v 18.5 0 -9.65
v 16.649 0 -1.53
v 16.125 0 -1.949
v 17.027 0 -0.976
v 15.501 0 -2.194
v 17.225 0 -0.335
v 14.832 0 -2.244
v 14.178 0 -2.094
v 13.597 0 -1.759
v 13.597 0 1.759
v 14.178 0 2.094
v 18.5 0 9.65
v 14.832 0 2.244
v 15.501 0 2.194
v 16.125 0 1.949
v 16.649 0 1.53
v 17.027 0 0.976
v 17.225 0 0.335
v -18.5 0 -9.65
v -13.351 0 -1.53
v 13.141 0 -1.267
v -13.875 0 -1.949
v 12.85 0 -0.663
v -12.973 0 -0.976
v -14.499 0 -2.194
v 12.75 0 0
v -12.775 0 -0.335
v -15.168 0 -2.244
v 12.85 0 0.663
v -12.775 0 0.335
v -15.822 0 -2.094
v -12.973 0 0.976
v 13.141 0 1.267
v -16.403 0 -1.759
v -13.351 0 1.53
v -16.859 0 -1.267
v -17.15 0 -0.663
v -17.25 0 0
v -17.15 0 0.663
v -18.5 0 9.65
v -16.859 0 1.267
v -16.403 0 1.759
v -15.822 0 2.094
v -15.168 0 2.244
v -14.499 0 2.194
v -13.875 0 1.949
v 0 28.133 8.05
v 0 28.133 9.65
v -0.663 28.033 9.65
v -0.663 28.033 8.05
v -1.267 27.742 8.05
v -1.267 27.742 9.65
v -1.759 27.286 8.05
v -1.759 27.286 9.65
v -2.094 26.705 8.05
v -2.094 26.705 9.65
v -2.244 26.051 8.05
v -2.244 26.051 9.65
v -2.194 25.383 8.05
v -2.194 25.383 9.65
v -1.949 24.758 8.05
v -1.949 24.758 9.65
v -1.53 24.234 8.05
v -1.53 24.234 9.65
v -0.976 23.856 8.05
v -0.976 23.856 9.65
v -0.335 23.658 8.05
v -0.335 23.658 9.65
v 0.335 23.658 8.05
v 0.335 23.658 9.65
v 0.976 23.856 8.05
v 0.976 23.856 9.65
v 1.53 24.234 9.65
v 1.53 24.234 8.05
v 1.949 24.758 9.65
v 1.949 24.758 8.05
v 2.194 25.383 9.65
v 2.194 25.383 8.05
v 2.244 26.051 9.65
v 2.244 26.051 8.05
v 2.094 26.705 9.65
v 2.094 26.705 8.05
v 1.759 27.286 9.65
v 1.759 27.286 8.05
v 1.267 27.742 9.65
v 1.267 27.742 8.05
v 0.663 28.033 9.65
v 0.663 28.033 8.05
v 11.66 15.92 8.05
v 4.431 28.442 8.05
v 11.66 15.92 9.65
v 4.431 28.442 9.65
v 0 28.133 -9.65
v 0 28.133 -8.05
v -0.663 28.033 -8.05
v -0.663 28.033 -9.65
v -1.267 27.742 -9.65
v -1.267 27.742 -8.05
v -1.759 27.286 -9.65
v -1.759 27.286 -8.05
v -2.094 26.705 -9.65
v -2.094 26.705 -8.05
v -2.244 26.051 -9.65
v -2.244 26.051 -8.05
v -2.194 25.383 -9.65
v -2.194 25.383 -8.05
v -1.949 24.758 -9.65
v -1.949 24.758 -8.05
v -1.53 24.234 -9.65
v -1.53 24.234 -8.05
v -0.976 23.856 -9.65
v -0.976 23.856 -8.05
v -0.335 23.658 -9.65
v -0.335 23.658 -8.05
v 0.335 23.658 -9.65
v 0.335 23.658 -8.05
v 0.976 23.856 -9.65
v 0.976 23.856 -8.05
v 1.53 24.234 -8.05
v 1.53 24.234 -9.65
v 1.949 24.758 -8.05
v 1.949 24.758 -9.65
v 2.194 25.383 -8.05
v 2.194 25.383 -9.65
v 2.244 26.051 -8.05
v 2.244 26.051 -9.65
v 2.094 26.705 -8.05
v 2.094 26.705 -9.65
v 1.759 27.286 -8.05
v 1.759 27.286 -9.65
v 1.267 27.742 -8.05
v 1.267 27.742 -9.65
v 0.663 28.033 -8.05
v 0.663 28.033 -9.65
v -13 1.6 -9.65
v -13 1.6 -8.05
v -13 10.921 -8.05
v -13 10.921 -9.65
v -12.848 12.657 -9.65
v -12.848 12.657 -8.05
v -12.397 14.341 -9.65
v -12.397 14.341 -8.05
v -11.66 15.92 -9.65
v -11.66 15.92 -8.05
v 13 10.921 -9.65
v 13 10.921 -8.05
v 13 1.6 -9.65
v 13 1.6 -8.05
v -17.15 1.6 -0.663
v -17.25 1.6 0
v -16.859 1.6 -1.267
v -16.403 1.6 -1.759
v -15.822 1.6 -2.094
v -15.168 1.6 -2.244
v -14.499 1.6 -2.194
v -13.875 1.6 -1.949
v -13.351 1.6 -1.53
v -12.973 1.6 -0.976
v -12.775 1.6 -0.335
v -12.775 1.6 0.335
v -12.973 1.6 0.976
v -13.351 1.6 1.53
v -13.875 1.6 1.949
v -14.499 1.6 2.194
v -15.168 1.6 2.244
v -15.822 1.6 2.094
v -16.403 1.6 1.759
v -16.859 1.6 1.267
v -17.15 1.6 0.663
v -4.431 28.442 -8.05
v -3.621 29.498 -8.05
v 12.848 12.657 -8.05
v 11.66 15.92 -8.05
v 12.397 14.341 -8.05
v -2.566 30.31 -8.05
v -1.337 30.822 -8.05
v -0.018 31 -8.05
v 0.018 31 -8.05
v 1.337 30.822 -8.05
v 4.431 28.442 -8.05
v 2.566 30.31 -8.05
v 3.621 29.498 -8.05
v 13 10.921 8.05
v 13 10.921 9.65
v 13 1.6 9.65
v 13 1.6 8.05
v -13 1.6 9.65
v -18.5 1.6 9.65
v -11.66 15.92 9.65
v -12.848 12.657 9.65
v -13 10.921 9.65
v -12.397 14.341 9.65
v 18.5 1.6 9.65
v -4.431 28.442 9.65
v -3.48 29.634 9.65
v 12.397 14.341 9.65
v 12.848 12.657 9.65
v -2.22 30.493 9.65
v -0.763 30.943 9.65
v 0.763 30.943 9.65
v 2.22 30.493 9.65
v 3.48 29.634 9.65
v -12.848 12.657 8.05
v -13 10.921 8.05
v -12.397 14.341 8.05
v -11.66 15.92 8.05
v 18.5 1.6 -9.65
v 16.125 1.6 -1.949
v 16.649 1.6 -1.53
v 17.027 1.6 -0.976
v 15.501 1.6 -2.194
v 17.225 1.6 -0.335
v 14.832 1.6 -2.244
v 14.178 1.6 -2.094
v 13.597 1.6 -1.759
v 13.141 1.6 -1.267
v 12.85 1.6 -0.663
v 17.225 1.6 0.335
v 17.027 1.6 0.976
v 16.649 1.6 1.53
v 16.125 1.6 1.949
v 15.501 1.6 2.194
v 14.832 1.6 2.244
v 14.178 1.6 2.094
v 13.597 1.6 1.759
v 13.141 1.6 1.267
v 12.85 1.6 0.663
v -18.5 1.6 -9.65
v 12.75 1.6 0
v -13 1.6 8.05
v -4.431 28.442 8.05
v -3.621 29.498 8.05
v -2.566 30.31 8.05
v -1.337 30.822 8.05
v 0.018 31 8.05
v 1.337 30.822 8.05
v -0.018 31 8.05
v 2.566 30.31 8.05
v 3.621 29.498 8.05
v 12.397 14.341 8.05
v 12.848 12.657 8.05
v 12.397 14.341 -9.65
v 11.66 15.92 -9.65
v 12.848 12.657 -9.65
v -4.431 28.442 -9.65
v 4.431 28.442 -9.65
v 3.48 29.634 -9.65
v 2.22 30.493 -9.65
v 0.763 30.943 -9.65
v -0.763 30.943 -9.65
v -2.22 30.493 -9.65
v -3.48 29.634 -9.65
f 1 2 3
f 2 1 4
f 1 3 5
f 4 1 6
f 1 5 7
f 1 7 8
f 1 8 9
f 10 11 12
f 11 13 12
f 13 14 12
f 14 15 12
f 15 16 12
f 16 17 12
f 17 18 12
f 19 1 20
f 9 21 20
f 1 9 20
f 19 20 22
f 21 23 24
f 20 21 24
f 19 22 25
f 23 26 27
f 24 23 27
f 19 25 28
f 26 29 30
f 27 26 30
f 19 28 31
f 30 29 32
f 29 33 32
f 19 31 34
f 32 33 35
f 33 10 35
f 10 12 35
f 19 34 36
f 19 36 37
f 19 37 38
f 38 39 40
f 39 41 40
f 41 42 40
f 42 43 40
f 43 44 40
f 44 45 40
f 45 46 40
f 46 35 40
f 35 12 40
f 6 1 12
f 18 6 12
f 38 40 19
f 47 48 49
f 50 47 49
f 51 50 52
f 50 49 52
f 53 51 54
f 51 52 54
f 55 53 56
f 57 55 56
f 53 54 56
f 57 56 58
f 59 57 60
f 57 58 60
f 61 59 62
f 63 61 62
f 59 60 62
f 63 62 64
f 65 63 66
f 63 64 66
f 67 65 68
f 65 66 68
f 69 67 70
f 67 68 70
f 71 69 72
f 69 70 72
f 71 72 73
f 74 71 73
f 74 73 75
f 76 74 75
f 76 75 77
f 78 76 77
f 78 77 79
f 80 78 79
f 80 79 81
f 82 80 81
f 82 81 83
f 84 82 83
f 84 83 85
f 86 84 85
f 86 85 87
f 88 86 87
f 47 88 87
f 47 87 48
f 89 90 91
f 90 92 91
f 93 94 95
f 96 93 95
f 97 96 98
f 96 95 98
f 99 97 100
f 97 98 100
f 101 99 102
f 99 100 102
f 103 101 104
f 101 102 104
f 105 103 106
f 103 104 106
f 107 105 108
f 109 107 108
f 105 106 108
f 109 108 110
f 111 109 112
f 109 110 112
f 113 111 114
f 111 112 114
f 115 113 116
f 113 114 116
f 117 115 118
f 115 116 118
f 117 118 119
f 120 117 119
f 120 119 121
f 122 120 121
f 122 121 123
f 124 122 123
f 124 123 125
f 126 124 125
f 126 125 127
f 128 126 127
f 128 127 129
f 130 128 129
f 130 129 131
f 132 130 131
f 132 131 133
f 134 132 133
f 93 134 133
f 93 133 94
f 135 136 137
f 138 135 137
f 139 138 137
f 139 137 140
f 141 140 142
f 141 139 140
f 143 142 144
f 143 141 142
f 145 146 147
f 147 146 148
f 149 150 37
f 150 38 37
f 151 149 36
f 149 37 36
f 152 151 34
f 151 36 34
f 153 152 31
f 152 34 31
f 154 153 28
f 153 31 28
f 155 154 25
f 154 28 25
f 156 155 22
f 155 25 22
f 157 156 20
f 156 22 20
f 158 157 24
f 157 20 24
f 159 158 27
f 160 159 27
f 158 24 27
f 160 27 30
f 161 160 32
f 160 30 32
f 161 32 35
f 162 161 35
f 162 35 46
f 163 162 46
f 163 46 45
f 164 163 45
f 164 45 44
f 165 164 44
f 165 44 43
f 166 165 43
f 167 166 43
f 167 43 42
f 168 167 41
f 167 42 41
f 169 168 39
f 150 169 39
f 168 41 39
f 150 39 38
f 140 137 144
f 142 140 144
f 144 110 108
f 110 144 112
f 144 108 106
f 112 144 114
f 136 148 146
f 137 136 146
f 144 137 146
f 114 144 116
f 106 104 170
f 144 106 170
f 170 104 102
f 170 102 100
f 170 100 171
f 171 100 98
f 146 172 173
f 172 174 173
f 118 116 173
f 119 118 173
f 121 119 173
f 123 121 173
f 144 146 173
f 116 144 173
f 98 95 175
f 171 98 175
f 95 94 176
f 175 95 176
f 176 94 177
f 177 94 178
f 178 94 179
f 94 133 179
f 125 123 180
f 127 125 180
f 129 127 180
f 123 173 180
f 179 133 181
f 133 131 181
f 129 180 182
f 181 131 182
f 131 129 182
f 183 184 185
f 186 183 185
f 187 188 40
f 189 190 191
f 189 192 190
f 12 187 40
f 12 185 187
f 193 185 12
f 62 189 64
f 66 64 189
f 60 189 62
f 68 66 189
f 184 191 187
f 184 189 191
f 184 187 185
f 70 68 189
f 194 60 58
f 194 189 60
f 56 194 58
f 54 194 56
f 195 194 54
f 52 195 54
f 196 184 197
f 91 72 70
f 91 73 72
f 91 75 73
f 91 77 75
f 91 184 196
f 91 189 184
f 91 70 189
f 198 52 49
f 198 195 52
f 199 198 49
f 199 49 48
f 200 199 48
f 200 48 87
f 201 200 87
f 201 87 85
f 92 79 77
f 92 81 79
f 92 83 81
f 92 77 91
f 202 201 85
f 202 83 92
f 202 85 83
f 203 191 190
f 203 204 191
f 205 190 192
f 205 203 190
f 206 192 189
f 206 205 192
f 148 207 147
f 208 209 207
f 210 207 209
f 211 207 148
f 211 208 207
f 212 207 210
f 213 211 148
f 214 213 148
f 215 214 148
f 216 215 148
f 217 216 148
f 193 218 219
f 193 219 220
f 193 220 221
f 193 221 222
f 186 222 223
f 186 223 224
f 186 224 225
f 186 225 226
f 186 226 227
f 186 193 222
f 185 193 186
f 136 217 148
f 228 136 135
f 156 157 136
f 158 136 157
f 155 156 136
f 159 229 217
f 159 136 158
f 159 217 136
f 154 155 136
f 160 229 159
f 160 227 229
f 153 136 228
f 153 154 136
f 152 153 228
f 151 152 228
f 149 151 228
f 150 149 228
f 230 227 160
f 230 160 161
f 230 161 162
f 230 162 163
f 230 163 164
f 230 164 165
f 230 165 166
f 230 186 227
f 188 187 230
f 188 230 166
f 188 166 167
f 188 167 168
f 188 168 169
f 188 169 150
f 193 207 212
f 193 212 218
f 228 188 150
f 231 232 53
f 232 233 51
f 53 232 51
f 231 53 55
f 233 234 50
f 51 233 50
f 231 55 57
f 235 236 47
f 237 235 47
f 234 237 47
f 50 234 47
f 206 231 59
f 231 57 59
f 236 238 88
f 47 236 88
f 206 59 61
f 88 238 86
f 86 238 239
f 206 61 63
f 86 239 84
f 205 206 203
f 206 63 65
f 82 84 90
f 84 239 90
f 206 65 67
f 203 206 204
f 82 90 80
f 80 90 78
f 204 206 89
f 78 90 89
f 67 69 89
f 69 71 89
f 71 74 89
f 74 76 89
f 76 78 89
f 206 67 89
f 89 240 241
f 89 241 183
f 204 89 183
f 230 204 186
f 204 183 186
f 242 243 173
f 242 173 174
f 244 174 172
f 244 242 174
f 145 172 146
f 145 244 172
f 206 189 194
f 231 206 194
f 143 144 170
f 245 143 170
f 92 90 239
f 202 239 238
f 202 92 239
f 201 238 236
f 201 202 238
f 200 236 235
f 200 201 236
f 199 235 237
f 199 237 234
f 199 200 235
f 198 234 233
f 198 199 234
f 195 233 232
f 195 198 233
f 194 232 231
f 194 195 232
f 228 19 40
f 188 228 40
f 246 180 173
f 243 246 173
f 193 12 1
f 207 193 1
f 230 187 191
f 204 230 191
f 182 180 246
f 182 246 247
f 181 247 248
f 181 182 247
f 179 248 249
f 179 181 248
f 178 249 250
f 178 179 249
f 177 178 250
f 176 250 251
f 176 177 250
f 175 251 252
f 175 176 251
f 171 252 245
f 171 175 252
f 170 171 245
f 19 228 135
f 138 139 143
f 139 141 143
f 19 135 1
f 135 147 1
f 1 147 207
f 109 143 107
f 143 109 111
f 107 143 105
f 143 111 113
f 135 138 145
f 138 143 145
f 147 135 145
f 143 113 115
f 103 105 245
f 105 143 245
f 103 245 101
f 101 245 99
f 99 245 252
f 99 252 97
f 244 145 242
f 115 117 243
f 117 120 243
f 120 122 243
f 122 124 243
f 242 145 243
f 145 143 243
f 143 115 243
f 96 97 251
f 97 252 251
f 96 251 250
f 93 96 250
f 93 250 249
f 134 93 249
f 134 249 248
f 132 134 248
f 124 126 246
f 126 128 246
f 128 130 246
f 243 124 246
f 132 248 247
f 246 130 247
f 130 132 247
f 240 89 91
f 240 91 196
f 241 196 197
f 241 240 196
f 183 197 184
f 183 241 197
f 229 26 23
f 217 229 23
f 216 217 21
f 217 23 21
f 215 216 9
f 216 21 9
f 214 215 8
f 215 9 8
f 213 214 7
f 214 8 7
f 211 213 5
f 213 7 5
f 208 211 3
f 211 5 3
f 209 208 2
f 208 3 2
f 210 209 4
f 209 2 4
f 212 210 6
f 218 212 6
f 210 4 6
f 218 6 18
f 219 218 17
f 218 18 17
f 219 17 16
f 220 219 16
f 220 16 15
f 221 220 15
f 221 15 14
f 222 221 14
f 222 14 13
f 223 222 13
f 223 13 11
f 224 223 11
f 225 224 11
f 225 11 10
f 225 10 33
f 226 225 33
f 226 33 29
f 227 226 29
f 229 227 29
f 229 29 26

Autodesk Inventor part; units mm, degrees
ref_plane "YZ Plane" through (0, 0, 0) normal (1, 0, 0) x (0, 1, 0)
ref_plane "XZ Plane" through (0, 0, 0) normal (0, 1, 0) x (-1, 0, 0)
ref_plane "XY Plane" through (0, 0, 0) normal (0, 0, 1) x (1, 0, 0)
sketch "スケッチ1" plane through (0, 0, 0) normal (0, 1, 0) x (-1, 0, 0)
  line L0 (18.5, 9.65) -> (-18.5, 9.65)
  line L1 (-18.5, 9.65) -> (-18.5, -9.65)
  line L2 (-18.5, -9.65) -> (18.5, -9.65)
  line L3 (18.5, -9.65) -> (18.5, 9.65)
  line L4 (0, 9.65) -> (0, -9.65)
  circle A0 centre (15, 0) radius 2.25
  circle A1 centre (-15, 0) radius 2.25
  point P0 (0, 0)
  point P1 (-15, 0)
  point P2 (0, 0)
  dimension "d0" = 37
  dimension "d1" = 19.3
  dimension "d2" = 30
  dimension "d3" = 4.5
extrude "押し出し1" add sketch "スケッチ1" along normal blind 1.6
sketch "スケッチ2" plane through (-18.5, 0, 9.65) normal (0, 0, 1) x (1, 0, 0)
  line L0 (0, 0) -> (0, 1.6) projected
  line L1 (5.5, 1.6) -> (5.5, 13.6)
  line L2 (5.5, 13.6) -> (14.0688, 28.4417)
  line L3 (22.9312, 28.4417) -> (31.5, 13.6)
  line L4 (31.5, 13.6) -> (31.5, 1.6)
  line L5 (13.6056, 31) -> (23.0857, 31) construction
  line L6 (0, 0) -> (37, 0) projected
  arc A0 (22.9312, 28.4417) -> (14.0688, 28.4417) centre (18.5, 25.8833) ccw
  line L7 (37, 0) -> (37, 1.6) projected
  line L8 (0, 1.6) -> (37, 1.6) construction
  line L9 (31.5, 1.6) -> (37, 1.6) construction
  line L10 (5.5, 1.6) -> (0, 1.6) construction
  line L11 (5.5, 1.6) -> (31.5, 1.6)
  point P0 (18.5, 0)
  point P1 (18.5, 35.8969)
  point P2 (18.5, 0)
  dimension "d6" = 12
  dimension "d7" = 31
  dimension "d14" = 26
  dimension "d15" = 60
extrude "押し出し2" add sketch "スケッチ2" against normal up to surface (19.3 mm away)
sketch "スケッチ3" plane through (18.5, 0, 9.65) normal (1, 0, 0) x (0, 0, -1)
  line L0 (0, 13.6) -> (0, 28.4417) projected
  line L1 (0, 0) -> (0, 1.6) projected
  line L2 (0, 0) -> (19.3, 0) projected
  line L3 (19.3, 0) -> (19.3, 1.6) projected
  line L4 (19.3, 13.6) -> (19.3, 28.4417) projected
  line L5 (19.3, 31) -> (19.3, 28.4417) projected
  line L6 (0, 31) -> (0, 28.4417) projected
  line L7 (1.6, 31) -> (1.6, 28.6547)
  line L8 (1.6, 28.6547) -> (1.6, 13.6)
  line L9 (1.6, 13.6) -> (1.6, 1.6)
  line L10 (1.6, 1.6) -> (17.7, 1.6)
  line L11 (17.7, 1.6) -> (17.7, 13.6)
  line L12 (17.7, 13.6) -> (17.7, 28.6547)
  line L13 (17.7, 28.6547) -> (17.7, 31)
  line L14 (1.6, 31) -> (17.7, 31)
  line L15 (0, 31) -> (19.3, 31) projected
  point P0 (9.65, 0)
  dimension "d10" = 1.6
extrude "押し出し3" cut sketch "スケッチ3" against normal through all
fillet "フィレット1" radius 10 4 edges at (13, 13.6, 8.85) (13, 13.6, -8.85) (-13, 13.6, -8.85) (-13, 13.6, 8.85)
sketch "スケッチ4" plane through (18.5, 0, -9.65) normal (0, 0, -1) x (-1, 0, 0)
  arc A0 (22.9312, 28.4417) -> (14.0688, 28.4417) centre (18.5, 25.8833) ccw projected
  point P0 (18.5, 0)
hole "穴1" at (0, 25.8833, -9.65) direction (0, 0, 1) diameter 4.5 depth 19.3
ref_plane "作業平面1" through (18.5, 0, 0) normal (0, 0, -1) x (-1, 0, 0)
properties part number "mounter" material "アルミニウム 6061"
